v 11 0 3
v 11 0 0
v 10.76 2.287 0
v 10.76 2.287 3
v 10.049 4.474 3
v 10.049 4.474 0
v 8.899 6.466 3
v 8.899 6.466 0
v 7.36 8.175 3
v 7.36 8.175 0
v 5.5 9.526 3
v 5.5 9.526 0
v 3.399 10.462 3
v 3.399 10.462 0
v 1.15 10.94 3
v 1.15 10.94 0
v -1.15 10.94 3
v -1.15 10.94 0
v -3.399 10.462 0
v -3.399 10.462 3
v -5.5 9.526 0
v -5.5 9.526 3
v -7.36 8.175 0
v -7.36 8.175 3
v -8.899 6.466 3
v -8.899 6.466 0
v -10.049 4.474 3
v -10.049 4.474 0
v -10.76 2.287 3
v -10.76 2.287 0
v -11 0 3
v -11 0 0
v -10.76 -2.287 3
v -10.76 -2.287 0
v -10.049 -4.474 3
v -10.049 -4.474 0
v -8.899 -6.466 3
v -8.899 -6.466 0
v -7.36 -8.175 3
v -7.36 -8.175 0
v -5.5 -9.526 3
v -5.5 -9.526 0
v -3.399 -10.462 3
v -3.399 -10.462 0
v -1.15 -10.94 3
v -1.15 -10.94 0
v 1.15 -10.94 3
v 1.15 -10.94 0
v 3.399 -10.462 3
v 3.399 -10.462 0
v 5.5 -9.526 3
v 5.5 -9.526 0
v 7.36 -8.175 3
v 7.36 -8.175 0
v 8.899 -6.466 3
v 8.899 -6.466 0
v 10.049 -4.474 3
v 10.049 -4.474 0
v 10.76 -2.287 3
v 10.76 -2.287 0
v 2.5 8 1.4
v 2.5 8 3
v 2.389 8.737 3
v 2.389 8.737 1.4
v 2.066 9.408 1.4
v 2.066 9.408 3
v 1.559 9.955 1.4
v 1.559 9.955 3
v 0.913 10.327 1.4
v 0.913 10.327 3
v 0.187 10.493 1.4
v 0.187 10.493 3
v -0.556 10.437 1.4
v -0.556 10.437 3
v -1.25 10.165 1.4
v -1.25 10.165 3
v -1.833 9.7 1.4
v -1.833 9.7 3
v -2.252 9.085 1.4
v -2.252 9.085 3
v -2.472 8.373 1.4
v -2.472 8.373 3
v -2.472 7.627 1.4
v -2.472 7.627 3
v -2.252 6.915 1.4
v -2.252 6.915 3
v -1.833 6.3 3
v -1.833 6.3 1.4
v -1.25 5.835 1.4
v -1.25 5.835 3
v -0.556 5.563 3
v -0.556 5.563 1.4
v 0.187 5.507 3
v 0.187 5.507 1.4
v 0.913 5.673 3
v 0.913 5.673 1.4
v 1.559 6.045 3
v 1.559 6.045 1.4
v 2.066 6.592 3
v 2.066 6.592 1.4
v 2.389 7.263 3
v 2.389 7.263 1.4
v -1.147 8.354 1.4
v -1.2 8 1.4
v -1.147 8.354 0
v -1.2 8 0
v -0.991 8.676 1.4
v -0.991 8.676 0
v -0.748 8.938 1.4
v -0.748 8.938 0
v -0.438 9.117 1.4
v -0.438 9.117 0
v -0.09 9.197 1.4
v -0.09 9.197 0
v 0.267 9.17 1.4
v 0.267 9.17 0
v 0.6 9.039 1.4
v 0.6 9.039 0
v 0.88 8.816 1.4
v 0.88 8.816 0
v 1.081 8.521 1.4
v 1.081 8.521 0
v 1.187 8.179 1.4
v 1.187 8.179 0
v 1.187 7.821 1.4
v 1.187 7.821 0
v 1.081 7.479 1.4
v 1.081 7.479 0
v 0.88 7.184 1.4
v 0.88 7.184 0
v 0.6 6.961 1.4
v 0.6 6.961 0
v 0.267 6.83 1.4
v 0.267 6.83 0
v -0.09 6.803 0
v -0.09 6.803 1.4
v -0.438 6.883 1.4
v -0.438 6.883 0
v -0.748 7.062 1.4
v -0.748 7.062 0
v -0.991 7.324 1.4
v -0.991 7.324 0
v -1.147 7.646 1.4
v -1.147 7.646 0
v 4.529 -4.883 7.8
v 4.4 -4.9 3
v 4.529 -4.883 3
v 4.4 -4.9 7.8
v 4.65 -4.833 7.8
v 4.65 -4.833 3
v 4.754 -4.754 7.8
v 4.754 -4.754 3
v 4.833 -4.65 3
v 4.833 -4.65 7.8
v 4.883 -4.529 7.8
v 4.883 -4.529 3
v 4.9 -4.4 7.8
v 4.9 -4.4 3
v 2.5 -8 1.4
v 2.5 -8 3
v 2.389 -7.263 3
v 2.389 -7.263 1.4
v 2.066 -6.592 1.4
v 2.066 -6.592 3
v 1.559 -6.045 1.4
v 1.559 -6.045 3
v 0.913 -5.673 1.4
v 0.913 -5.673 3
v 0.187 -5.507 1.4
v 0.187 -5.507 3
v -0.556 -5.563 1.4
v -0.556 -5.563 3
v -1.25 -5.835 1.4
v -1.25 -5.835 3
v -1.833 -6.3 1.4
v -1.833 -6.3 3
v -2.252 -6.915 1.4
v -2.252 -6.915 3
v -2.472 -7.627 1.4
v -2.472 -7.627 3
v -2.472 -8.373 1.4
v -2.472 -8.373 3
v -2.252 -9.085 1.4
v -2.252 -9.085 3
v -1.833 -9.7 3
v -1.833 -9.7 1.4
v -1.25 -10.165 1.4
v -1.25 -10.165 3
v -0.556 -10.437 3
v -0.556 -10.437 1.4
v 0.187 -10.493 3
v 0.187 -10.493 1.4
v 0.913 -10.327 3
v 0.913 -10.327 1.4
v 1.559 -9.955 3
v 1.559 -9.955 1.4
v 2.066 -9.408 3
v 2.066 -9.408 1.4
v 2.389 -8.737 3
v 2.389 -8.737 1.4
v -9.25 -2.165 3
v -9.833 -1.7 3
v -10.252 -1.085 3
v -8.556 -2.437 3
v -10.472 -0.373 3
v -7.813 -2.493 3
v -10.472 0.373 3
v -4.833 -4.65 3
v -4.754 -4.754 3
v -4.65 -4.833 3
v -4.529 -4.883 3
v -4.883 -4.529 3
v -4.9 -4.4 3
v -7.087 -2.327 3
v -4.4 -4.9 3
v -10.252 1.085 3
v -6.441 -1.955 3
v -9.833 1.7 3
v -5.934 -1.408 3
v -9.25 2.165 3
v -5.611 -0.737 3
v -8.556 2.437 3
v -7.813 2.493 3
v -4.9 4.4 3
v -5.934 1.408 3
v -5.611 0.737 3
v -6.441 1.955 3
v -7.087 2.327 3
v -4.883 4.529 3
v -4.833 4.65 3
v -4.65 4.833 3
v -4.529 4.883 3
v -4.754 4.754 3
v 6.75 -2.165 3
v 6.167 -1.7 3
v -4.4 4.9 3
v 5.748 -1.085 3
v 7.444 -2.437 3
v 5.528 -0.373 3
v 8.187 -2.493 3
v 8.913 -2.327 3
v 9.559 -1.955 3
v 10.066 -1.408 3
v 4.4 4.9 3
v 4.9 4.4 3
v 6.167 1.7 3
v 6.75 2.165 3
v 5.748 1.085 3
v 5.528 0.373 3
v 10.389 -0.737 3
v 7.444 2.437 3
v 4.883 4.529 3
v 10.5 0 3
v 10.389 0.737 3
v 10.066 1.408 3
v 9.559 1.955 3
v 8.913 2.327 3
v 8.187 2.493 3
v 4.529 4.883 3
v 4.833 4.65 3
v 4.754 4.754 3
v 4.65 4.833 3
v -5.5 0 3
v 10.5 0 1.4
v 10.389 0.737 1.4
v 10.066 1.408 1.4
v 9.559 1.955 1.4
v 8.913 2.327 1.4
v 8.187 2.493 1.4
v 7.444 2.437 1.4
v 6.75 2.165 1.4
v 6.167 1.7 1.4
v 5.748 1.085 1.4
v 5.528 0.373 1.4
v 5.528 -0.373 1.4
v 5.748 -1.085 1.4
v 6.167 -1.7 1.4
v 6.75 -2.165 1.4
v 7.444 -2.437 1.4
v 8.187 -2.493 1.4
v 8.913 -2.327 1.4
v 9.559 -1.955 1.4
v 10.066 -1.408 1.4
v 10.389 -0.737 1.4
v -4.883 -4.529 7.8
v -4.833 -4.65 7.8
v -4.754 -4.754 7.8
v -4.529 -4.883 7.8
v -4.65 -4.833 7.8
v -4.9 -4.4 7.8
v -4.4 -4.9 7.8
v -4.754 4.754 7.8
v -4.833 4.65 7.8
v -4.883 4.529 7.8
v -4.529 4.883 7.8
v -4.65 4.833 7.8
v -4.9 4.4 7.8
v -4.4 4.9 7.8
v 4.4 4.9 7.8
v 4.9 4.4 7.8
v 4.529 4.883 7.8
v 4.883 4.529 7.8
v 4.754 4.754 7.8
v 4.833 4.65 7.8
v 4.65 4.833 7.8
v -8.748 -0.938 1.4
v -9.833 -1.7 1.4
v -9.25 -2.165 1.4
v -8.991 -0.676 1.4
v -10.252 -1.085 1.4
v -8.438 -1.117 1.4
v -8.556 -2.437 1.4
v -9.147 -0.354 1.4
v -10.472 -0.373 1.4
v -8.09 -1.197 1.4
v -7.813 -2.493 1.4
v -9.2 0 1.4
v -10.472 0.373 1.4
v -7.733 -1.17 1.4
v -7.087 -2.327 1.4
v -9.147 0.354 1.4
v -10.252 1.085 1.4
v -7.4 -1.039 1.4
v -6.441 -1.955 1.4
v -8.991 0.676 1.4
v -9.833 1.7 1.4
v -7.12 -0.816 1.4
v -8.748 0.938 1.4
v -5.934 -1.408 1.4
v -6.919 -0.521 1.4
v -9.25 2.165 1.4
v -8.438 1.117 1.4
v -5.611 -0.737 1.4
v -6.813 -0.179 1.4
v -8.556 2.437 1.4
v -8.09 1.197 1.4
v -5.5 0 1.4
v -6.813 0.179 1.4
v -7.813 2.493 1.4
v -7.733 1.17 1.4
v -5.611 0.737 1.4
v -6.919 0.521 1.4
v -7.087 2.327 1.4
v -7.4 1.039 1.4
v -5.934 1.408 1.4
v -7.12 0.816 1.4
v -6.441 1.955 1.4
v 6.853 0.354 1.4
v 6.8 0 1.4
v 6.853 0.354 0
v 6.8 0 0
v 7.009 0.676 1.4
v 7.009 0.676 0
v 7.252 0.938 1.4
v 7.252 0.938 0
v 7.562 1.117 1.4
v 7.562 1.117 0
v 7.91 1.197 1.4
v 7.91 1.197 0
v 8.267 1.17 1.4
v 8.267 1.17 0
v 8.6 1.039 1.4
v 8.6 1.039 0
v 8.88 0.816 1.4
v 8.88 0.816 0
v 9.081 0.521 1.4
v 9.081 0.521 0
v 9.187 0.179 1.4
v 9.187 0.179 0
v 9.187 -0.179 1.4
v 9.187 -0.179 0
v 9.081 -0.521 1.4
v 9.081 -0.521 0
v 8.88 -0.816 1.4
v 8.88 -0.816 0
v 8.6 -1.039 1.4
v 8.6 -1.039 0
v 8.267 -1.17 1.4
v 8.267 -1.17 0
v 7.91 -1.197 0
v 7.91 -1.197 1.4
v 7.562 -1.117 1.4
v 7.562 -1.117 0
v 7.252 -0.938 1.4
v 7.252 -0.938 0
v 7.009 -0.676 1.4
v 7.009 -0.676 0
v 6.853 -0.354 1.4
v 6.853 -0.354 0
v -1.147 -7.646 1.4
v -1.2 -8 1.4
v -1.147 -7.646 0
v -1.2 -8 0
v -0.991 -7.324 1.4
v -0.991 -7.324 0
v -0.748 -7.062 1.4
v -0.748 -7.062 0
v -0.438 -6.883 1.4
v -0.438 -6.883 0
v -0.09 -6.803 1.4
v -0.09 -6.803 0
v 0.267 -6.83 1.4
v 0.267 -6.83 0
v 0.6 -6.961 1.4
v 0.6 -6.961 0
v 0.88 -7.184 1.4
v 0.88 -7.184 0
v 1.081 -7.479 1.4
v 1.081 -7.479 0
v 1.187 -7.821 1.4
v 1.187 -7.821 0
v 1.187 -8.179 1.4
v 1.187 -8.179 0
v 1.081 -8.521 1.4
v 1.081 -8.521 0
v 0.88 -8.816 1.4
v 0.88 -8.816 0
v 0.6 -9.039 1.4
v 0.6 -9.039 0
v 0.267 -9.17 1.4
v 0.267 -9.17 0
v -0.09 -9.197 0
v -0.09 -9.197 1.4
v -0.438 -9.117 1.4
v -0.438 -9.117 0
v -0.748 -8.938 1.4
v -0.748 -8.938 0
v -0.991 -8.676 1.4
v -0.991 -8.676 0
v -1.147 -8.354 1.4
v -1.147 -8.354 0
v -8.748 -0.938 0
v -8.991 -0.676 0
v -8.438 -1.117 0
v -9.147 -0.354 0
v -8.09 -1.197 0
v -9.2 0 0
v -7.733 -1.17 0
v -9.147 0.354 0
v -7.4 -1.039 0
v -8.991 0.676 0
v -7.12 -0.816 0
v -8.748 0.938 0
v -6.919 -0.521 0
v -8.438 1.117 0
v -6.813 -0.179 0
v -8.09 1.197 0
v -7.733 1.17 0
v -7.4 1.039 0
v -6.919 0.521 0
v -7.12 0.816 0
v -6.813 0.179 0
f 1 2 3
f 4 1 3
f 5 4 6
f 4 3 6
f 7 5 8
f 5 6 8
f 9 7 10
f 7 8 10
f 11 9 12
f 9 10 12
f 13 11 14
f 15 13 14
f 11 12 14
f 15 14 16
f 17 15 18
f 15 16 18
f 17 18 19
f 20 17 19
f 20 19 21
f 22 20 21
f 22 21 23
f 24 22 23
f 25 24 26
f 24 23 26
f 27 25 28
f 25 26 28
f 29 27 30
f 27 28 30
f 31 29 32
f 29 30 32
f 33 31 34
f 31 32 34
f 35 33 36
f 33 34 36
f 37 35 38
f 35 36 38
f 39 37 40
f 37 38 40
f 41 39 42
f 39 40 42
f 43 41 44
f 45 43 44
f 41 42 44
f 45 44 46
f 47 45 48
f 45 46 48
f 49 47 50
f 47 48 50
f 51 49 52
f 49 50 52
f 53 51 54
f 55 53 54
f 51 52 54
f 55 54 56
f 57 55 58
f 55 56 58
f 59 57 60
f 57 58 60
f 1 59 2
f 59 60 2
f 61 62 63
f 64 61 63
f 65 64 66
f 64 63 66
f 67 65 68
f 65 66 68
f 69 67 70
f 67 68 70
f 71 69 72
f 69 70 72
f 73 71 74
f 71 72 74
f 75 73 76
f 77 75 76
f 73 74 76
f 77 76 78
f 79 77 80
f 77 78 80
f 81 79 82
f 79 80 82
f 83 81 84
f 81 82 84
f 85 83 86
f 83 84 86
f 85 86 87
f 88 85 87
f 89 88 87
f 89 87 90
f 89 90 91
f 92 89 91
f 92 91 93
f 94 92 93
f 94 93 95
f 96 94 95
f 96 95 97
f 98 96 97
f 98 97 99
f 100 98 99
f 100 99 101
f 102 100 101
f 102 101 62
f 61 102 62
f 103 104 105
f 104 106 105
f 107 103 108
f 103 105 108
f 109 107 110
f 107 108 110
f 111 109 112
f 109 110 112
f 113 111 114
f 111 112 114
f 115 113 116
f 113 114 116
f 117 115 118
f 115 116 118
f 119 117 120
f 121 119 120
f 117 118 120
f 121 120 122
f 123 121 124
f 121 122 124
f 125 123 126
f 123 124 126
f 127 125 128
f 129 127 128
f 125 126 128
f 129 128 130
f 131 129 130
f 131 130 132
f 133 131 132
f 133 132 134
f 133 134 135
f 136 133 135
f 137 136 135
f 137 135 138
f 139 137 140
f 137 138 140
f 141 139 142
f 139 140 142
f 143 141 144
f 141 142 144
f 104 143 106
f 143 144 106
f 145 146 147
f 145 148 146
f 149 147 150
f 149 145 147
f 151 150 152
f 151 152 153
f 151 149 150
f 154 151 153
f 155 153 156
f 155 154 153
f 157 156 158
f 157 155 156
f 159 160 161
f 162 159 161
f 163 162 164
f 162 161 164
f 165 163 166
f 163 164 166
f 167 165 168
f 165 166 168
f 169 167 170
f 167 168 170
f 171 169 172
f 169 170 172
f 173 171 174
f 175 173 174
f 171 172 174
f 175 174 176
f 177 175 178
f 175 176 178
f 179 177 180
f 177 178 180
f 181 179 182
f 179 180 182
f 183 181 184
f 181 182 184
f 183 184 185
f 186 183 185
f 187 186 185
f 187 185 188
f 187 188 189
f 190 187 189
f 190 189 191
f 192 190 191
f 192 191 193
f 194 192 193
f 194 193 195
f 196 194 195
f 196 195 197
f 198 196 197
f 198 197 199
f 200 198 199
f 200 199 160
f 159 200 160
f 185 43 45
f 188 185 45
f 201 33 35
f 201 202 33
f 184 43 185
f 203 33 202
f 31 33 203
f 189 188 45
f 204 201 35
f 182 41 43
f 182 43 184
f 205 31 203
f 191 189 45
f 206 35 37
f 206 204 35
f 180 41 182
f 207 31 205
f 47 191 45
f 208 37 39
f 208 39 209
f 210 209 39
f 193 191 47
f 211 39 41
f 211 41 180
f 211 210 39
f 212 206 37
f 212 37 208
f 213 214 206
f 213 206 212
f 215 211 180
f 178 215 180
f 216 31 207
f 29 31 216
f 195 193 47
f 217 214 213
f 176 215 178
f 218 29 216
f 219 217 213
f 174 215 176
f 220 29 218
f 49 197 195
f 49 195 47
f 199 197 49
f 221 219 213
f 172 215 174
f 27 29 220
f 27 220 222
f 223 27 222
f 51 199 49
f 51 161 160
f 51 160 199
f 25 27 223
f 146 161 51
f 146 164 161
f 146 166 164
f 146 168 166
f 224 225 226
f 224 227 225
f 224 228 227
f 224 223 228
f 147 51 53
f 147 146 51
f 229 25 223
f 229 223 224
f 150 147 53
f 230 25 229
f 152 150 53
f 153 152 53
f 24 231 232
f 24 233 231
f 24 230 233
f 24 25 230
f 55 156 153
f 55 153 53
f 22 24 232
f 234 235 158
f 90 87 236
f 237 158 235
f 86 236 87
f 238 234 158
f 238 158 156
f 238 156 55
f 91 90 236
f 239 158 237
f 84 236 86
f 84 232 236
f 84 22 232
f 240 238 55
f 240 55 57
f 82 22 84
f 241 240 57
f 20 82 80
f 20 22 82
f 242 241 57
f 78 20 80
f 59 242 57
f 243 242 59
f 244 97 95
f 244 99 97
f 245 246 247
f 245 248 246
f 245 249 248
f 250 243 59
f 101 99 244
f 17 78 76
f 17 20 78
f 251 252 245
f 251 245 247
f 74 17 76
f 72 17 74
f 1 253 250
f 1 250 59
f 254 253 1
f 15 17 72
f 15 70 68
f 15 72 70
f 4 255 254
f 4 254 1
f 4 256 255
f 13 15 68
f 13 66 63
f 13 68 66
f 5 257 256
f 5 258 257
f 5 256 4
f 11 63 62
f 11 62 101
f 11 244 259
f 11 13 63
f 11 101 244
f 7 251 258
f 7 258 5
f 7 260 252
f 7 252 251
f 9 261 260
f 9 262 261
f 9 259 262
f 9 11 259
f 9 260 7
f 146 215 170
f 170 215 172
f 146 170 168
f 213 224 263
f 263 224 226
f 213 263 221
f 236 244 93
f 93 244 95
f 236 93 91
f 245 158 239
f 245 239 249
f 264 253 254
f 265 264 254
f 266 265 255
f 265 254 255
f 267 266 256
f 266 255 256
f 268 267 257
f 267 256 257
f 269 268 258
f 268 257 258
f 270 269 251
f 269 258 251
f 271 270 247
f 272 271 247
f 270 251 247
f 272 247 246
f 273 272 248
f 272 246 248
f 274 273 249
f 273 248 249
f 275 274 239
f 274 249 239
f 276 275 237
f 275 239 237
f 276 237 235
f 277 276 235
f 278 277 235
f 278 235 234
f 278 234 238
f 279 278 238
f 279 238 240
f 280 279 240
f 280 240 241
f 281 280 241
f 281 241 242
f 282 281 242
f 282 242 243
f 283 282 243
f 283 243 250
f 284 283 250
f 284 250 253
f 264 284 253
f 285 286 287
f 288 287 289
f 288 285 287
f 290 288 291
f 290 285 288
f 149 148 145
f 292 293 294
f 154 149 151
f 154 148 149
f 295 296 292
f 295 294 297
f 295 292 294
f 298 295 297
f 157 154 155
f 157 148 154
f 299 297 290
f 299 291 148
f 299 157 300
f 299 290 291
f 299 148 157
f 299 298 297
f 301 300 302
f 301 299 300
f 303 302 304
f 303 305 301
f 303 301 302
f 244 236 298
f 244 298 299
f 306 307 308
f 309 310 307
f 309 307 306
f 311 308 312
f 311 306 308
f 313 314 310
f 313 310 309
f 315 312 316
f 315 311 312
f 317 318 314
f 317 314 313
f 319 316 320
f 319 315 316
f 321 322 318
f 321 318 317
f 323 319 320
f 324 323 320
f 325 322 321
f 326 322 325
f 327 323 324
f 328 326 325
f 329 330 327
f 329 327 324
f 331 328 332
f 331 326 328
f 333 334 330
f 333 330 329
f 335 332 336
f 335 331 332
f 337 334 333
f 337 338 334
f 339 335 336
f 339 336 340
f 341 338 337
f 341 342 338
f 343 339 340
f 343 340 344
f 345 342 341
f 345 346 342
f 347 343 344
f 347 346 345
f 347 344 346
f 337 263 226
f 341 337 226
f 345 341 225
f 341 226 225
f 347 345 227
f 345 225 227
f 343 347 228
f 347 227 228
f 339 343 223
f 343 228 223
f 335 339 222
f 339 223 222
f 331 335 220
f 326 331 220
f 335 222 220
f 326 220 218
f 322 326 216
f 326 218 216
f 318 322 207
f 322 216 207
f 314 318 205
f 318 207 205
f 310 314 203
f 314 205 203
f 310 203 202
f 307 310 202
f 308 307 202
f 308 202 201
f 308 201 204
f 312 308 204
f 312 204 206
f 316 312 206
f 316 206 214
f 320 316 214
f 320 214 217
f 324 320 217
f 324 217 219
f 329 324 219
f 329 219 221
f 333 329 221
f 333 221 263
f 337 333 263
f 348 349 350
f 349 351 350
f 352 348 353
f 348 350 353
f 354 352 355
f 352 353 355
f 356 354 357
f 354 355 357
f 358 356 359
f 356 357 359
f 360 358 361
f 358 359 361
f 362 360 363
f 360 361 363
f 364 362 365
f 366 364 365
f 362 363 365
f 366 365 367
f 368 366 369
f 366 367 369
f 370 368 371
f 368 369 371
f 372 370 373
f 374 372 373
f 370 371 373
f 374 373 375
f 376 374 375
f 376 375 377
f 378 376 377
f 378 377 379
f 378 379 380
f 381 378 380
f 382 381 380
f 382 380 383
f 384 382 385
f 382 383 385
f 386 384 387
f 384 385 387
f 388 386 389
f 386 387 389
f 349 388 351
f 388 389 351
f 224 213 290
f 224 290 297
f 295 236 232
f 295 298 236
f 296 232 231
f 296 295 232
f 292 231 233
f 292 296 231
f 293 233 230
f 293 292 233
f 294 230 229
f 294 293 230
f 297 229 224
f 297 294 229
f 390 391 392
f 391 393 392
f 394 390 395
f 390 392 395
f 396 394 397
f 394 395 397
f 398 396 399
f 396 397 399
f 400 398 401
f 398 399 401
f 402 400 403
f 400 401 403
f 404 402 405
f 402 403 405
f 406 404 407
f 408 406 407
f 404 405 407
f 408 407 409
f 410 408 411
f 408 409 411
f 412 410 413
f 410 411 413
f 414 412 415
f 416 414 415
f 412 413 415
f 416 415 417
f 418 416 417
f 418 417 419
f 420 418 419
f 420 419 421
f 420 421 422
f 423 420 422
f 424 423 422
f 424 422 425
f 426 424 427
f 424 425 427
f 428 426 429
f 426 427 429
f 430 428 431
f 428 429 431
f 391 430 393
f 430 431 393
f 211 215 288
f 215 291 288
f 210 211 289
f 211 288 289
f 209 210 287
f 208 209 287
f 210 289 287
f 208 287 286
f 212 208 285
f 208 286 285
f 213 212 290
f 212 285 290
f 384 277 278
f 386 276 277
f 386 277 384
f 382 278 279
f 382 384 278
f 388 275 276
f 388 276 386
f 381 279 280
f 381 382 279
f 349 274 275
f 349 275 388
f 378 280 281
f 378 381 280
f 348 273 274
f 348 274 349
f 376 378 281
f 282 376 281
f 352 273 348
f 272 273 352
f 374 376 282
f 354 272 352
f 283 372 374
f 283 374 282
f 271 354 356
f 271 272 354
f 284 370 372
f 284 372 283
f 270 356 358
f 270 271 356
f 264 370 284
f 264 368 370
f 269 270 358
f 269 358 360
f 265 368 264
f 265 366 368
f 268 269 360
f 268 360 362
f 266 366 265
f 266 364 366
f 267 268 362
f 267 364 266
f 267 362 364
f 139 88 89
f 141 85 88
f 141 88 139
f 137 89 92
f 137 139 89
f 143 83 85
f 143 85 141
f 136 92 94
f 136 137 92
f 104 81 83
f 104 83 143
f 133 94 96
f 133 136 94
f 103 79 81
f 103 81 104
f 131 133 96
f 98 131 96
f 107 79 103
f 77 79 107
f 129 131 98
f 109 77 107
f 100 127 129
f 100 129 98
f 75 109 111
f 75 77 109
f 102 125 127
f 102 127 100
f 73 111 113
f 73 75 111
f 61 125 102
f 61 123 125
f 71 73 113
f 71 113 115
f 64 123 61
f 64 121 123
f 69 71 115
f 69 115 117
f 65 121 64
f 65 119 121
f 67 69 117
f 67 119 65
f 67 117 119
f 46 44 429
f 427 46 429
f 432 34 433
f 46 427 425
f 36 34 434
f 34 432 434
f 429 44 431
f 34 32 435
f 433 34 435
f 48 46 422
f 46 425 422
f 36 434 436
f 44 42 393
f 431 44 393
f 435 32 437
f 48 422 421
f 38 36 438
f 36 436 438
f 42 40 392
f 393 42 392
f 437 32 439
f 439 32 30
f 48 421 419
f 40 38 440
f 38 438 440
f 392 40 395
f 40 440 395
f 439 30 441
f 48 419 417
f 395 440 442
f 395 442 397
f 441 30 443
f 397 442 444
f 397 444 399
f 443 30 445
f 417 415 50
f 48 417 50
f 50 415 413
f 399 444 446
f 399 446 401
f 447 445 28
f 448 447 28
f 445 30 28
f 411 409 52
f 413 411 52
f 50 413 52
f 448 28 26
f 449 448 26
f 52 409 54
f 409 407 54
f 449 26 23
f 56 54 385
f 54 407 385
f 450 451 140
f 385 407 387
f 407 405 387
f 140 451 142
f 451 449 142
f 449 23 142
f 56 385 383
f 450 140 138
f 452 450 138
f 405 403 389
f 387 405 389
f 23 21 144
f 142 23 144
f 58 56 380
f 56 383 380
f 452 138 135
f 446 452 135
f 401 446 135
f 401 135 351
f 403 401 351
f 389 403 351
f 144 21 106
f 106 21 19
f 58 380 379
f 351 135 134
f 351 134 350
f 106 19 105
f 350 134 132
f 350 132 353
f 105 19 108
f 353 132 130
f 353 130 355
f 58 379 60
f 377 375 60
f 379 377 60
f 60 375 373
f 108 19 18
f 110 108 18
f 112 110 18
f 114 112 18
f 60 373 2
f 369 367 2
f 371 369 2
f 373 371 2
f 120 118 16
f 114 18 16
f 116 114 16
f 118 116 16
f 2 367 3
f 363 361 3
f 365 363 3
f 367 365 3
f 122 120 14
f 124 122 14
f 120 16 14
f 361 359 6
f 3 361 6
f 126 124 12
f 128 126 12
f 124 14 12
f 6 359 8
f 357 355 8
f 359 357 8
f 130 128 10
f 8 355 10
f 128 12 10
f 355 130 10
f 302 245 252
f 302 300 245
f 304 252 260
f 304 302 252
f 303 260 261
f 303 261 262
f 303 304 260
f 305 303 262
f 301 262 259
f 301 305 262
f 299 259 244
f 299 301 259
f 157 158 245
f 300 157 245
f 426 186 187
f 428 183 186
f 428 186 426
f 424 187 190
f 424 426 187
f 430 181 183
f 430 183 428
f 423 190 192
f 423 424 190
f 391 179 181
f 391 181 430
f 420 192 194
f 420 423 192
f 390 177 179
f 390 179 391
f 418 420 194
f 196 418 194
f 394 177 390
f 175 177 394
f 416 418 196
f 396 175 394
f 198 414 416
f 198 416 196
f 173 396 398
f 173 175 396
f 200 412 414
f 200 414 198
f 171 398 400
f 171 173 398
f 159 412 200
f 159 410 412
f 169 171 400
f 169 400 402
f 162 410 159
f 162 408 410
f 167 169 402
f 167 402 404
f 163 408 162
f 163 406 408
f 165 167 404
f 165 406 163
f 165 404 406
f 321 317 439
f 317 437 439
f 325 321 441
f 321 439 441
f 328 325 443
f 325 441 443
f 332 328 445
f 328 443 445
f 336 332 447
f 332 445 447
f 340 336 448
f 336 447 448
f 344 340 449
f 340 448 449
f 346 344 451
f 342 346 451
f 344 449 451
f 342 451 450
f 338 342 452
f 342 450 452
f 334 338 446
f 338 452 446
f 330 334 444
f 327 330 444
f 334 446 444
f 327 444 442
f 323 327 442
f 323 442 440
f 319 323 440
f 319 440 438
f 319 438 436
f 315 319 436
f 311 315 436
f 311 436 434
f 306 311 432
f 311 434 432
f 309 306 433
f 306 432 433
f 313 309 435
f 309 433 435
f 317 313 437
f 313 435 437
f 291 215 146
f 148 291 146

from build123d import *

# Parameters (mm, degrees)
SZKIC1_R                                          = 11
DODANIE_WYCI_GNI_CIE1_DEPTH                       = 3
POG_BIENIE_WALCOWE_POD_M2_RUB_Z_BEM_S_D           = 2.4
POG_BIENIE_WALCOWE_POD_M2_RUB_Z_BEM_S_CBORE_D     = 5
POG_BIENIE_WALCOWE_POD_M2_RUB_Z_BEM_S_CBORE_DEPTH = 1.6
SZKIC4_W                                          = 9.8
SZKIC4_H                                          = 9.8
DODANIE_WYCI_GNI_CIE2_DEPTH                       = 4.8
ZAOKR_GLENIE1_R                                   = 0.5


with BuildPart() as part:
    # Szkic1 → Dodanie-wyciągnięcie1 (new body)
    with BuildSketch(Plane.XY):
        Circle(SZKIC1_R)
    extrude(amount=DODANIE_WYCI_GNI_CIE1_DEPTH)

    # Pogłębienie walcowe pod M2 Śrubę z łbem stożkowym ściętym1 (through all)
    with Locations(Plane.XY.offset(3)):
        with Locations((-8, 0), (0, 8), (0, -8), (8, 0)):
            CounterBoreHole(POG_BIENIE_WALCOWE_POD_M2_RUB_Z_BEM_S_D / 2, POG_BIENIE_WALCOWE_POD_M2_RUB_Z_BEM_S_CBORE_D / 2, POG_BIENIE_WALCOWE_POD_M2_RUB_Z_BEM_S_CBORE_DEPTH)

    # Szkic4 → Dodanie-wyciągnięcie2 (add)
    with BuildSketch(Plane.XY.offset(3)):
        Rectangle(SZKIC4_W, SZKIC4_H)
    extrude(amount=DODANIE_WYCI_GNI_CIE2_DEPTH)

    # Zaokrąglenie1
    zaokr_glenie1_edges = [part.edges().sort_by_distance(p)[0] for p in [
        (4.9, -4.9, 5.4),
        (4.9, 4.9, 5.4),
        (-4.9, 4.9, 5.4),
        (-4.9, -4.9, 5.4),
    ]]
    fillet(zaokr_glenie1_edges, radius=ZAOKR_GLENIE1_R)


solid = part.part
